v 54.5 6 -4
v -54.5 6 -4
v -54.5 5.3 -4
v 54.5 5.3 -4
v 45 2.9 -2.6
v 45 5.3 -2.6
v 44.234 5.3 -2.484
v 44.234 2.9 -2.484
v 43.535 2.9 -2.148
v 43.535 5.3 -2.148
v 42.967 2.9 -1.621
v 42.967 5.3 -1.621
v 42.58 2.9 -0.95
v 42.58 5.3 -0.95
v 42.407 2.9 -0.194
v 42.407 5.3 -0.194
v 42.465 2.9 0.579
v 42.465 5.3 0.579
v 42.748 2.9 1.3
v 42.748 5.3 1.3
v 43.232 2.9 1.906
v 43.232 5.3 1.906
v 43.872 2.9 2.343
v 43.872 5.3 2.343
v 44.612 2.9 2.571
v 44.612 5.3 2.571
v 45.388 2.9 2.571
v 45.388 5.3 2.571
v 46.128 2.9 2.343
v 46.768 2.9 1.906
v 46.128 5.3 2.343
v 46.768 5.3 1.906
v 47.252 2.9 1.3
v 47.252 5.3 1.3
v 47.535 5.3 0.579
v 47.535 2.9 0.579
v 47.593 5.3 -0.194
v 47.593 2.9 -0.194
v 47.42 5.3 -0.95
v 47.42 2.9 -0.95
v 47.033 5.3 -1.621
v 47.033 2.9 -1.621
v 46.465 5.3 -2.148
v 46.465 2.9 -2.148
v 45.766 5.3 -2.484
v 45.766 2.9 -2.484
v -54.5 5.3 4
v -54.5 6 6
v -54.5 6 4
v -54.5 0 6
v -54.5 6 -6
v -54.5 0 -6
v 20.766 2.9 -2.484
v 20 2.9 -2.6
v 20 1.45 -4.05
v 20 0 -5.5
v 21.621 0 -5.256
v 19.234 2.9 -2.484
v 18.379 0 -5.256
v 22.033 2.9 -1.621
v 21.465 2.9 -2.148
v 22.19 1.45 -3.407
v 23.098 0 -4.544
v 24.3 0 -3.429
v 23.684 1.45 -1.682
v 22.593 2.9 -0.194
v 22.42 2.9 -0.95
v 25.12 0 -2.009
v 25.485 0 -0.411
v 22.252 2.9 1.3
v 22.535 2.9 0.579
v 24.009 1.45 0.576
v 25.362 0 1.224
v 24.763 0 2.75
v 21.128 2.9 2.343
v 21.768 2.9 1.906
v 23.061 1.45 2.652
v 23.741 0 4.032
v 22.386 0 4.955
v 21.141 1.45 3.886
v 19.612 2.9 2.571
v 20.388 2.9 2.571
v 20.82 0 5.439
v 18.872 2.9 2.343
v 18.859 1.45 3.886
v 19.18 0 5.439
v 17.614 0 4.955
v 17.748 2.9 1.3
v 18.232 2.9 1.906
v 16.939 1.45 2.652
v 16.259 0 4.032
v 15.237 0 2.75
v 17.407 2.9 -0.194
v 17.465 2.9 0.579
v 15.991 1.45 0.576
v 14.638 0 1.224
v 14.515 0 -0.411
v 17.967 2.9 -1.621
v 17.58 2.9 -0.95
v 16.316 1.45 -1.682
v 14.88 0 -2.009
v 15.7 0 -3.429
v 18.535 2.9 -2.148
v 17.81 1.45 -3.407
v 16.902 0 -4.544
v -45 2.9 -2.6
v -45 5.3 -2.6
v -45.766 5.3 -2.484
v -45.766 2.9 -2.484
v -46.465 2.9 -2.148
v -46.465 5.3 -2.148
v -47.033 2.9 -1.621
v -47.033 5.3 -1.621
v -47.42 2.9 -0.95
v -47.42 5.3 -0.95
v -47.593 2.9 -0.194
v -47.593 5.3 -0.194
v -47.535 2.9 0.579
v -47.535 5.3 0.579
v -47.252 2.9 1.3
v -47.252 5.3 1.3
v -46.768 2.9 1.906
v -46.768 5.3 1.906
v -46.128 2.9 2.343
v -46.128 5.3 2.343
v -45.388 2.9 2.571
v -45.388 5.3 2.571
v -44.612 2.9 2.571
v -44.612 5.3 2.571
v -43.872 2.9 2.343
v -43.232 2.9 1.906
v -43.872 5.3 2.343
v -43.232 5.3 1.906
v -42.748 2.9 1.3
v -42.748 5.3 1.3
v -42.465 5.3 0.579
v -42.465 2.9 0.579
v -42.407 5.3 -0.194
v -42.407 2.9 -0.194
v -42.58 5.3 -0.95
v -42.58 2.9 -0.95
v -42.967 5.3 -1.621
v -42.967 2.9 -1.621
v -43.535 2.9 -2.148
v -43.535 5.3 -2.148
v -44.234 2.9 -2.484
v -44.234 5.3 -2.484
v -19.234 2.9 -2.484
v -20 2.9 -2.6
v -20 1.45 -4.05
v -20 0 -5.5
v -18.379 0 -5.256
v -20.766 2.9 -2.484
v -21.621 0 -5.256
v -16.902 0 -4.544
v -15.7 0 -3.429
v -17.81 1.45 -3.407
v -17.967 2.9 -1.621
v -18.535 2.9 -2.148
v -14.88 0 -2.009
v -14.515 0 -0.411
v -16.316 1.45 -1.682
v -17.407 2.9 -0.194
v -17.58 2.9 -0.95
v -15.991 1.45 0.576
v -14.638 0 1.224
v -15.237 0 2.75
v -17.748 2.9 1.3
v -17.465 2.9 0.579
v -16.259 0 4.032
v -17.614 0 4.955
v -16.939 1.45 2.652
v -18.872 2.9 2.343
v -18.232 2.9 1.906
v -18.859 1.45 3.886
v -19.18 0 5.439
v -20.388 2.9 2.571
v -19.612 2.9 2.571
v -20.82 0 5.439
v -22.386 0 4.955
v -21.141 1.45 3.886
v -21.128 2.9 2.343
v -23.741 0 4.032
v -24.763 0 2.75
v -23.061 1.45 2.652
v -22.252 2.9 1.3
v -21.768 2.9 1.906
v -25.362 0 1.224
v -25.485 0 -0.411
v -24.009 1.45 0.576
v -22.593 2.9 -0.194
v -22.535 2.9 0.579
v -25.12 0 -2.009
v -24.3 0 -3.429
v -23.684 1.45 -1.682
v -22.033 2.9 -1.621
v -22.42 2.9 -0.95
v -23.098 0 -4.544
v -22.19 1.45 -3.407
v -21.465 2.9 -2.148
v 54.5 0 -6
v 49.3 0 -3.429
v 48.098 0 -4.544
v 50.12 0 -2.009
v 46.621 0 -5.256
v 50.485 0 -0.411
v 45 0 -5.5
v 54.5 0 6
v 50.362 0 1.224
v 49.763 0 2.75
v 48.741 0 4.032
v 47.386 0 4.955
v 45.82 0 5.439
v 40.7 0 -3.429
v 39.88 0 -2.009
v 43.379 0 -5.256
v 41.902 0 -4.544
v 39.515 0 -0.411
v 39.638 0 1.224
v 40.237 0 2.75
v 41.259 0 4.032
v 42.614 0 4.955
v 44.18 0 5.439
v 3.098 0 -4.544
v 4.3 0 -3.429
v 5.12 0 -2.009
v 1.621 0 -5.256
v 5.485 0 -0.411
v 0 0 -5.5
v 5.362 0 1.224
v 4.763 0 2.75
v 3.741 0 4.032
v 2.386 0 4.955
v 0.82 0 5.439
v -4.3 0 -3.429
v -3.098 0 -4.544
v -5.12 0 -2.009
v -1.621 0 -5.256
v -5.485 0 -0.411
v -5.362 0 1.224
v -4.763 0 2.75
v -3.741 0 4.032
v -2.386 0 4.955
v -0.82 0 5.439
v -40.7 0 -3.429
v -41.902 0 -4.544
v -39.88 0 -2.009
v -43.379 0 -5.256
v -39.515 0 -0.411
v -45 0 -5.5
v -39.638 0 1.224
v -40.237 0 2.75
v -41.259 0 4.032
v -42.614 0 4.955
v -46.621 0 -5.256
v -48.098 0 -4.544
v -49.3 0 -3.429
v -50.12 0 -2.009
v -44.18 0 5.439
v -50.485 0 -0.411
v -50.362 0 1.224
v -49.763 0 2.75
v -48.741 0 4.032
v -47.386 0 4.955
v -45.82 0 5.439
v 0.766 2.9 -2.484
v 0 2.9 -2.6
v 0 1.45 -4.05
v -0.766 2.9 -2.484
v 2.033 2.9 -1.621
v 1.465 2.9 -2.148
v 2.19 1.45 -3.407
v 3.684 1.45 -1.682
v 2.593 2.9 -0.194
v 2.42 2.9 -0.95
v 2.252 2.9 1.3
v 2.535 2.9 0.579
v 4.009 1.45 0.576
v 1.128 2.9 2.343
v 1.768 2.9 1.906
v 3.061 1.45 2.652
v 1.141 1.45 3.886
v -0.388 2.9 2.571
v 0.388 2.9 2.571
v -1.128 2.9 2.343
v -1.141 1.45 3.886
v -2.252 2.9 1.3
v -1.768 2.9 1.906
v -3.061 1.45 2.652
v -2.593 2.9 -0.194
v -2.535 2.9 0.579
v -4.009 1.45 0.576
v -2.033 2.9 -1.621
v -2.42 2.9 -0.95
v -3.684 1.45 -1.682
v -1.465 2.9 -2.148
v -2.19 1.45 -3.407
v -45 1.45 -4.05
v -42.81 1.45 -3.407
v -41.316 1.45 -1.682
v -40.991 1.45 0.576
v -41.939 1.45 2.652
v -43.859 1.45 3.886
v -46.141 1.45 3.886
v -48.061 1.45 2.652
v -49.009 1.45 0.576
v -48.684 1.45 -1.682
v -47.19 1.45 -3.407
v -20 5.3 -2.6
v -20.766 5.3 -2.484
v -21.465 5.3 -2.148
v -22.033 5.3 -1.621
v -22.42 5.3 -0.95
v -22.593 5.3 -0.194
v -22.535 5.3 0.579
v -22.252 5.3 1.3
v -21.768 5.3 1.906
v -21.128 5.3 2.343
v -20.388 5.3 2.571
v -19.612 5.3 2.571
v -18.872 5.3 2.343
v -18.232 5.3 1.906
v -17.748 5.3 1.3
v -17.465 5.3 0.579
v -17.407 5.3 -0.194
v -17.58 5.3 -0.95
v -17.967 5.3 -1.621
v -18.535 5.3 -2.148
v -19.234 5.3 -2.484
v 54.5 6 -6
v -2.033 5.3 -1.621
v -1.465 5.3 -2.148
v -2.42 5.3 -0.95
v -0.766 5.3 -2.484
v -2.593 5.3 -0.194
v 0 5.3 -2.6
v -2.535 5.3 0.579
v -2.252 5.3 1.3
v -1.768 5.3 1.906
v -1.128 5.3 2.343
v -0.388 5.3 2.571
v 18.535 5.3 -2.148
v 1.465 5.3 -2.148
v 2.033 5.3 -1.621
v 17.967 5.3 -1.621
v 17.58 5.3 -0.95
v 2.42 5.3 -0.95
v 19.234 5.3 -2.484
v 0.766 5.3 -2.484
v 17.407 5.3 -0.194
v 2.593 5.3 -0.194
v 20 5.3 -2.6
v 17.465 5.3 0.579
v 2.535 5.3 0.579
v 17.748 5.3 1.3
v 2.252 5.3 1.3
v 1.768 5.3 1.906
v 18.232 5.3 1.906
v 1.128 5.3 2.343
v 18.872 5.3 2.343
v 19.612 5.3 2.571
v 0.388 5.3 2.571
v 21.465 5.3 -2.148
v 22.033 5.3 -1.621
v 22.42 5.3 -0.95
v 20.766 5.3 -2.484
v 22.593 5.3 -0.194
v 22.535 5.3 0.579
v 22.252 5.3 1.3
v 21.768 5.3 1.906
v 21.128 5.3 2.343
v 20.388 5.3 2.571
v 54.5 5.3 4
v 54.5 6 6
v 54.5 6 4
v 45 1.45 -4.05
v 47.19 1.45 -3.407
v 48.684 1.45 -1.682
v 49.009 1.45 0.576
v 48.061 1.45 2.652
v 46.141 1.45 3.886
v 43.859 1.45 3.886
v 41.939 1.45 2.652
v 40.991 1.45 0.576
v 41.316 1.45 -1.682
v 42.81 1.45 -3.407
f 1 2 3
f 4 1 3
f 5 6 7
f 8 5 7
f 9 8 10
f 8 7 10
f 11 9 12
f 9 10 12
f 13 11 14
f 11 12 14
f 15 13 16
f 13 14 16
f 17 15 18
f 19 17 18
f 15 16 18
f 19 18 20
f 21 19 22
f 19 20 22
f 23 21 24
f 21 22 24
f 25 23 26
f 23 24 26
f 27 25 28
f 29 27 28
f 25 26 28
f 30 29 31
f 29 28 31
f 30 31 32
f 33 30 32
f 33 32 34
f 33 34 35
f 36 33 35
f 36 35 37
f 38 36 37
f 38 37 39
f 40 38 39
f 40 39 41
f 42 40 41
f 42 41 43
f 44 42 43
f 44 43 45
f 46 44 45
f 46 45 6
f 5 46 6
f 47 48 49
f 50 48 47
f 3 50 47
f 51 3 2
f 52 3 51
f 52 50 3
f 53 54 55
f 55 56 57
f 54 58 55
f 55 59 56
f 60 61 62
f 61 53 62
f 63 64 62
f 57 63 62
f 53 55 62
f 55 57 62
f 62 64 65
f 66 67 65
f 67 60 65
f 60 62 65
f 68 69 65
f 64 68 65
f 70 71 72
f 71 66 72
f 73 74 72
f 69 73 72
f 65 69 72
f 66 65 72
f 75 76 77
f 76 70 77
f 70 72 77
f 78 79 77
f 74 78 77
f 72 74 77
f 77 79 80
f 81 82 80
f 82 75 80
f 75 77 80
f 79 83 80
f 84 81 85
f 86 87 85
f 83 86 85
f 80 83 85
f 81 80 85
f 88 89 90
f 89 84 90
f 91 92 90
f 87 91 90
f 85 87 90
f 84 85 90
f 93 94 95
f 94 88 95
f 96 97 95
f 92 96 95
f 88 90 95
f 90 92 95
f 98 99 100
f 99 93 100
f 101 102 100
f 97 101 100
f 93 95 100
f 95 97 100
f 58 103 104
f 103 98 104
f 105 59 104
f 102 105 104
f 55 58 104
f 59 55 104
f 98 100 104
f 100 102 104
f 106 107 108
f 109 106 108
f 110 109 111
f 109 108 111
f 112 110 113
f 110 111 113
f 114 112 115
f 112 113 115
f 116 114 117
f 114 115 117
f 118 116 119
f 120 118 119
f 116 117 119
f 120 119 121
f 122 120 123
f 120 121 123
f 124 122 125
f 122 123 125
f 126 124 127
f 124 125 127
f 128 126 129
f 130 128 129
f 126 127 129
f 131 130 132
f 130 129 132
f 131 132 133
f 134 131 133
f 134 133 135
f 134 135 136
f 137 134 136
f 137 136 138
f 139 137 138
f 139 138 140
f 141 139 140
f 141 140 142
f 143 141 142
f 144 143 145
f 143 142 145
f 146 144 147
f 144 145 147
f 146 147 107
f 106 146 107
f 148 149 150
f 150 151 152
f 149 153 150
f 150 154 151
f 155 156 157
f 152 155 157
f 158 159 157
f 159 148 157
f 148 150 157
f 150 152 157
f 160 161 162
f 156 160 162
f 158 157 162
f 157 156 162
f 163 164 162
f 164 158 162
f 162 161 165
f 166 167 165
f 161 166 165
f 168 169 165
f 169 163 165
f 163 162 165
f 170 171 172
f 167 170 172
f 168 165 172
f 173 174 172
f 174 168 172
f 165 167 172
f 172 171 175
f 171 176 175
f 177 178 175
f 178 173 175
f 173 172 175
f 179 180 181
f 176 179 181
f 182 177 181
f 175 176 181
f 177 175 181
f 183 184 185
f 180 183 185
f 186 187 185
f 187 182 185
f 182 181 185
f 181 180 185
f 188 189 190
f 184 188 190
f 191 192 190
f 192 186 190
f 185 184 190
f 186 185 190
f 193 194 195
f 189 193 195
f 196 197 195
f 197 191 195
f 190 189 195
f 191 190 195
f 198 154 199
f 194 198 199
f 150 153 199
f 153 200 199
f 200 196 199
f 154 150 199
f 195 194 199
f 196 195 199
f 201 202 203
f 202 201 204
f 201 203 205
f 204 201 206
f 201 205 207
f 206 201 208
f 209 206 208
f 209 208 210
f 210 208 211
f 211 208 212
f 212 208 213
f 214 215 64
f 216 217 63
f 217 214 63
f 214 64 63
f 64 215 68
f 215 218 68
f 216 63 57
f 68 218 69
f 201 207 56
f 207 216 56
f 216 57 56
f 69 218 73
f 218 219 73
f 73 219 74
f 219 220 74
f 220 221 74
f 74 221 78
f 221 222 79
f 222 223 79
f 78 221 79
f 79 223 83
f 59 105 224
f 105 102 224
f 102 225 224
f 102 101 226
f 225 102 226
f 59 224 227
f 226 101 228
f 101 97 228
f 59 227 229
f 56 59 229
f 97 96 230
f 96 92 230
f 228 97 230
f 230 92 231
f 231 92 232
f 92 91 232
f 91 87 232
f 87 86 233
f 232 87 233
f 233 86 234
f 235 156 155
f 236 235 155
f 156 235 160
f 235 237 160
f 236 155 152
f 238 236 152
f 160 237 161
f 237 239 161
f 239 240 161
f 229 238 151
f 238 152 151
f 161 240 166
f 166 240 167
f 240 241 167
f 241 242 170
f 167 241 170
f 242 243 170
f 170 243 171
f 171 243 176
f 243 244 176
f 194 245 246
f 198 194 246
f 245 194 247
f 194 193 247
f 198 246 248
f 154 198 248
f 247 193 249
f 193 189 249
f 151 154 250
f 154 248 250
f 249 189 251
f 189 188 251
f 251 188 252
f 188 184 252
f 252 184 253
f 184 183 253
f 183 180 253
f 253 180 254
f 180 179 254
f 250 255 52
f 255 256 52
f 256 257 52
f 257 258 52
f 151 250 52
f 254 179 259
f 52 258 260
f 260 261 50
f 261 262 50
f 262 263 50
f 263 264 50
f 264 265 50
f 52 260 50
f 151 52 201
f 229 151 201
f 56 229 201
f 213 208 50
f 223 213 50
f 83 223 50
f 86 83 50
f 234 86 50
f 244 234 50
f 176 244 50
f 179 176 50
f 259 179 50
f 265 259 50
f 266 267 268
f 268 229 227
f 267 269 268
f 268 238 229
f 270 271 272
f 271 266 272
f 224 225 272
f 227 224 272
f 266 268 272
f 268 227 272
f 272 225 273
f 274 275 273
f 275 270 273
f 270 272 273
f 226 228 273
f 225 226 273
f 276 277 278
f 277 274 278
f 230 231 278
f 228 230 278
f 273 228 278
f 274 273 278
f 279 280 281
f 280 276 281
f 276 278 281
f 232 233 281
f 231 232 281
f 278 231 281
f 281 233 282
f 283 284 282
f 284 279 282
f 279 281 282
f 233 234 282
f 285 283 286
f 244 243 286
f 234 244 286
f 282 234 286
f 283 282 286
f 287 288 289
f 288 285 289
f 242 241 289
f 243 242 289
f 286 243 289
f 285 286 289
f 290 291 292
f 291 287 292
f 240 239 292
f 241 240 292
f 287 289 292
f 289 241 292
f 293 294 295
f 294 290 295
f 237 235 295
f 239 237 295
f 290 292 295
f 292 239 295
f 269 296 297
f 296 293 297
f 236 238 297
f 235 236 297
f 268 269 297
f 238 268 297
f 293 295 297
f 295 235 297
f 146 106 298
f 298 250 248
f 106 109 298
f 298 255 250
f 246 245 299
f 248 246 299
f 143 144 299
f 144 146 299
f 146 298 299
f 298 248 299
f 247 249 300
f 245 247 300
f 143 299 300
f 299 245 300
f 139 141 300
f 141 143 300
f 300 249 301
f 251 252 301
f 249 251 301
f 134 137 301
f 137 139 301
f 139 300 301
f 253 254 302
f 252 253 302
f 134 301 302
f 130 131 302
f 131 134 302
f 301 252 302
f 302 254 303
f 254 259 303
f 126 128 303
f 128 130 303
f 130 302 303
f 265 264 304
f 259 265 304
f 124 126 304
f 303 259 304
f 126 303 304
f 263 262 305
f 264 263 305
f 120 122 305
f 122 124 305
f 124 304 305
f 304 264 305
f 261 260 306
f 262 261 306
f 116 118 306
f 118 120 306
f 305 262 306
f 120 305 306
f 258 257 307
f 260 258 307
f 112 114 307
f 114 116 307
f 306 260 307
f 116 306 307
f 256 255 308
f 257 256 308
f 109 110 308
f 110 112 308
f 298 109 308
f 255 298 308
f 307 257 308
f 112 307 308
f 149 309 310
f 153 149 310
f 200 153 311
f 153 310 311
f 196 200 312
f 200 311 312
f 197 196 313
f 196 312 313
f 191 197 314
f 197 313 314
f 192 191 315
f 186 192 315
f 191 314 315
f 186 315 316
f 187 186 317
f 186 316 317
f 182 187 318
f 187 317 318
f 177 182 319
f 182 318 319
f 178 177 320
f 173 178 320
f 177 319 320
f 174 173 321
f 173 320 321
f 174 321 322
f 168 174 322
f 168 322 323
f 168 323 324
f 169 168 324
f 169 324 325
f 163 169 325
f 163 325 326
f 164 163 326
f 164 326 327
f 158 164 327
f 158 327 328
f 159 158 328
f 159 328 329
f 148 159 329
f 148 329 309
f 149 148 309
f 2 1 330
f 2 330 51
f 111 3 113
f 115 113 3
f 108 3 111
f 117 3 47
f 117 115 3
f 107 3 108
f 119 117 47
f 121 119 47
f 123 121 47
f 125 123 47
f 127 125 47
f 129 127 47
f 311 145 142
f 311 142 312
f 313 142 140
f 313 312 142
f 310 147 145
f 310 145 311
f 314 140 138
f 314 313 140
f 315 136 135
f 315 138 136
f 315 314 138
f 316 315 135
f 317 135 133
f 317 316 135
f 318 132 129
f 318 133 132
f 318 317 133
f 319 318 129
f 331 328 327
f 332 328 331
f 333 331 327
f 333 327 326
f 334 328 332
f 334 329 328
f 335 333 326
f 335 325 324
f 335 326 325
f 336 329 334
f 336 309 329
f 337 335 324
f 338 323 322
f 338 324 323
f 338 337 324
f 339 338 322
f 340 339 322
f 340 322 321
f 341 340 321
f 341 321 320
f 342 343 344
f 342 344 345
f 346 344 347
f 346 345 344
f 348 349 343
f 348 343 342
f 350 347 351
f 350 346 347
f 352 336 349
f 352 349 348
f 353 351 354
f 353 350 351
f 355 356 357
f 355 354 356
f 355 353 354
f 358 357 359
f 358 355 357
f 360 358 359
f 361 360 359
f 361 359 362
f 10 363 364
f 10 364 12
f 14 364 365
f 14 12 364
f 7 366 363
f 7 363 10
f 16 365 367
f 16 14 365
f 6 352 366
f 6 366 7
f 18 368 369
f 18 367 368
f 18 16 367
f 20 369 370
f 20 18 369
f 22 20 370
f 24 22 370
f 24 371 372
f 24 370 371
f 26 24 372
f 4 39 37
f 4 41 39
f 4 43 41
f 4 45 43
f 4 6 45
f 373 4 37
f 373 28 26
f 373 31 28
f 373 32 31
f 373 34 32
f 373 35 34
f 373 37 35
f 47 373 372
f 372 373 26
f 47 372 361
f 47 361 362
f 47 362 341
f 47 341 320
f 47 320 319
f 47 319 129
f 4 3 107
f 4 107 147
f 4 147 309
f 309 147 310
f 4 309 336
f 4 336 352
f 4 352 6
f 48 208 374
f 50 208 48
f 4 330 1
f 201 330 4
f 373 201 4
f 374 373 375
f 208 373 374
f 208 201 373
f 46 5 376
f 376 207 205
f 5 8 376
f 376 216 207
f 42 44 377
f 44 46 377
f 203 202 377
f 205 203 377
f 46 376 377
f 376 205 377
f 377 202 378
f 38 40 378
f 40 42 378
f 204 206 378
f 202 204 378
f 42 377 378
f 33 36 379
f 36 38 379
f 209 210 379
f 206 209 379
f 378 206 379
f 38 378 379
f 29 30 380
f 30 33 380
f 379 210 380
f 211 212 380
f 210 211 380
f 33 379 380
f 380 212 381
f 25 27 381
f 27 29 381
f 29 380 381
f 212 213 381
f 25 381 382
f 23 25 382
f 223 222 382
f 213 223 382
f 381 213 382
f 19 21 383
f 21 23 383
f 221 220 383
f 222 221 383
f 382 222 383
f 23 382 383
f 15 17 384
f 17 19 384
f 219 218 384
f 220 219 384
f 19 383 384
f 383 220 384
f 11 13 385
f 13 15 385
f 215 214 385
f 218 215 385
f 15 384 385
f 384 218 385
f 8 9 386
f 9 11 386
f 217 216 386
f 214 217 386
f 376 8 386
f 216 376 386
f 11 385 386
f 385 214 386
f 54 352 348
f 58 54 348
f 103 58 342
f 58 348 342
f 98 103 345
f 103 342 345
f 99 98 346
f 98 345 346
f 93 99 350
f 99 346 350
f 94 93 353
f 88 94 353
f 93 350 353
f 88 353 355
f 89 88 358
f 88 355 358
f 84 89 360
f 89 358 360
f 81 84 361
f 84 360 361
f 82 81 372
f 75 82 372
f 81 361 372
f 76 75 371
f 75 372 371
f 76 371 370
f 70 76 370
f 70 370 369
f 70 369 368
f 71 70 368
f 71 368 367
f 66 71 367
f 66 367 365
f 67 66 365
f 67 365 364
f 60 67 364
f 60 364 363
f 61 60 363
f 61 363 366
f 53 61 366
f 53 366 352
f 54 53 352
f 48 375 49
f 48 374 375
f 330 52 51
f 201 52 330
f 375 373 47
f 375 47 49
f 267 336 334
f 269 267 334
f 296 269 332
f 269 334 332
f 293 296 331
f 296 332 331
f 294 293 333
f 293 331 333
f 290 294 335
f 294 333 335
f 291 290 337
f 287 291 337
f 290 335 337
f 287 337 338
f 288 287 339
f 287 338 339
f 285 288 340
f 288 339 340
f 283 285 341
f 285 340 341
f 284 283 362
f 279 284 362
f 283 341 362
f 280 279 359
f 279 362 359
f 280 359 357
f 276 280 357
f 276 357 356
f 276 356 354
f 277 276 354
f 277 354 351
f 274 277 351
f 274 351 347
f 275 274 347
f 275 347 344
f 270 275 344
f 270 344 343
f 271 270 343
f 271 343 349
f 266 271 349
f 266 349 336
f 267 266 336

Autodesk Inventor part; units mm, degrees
ref_plane "YZ Plane" through (0, 0, 0) normal (1, 0, 0) x (0, 1, 0)
ref_plane "XZ Plane" through (0, 0, 0) normal (0, 1, 0) x (-1, 0, 0)
ref_plane "XY Plane" through (0, 0, 0) normal (0, 0, 1) x (1, 0, 0)
sketch "Body Outline" plane through (0, 0, 0) normal (0, 1, 0) x (-1, 0, 0)
  line L0 (54.5, -6) -> (-54.5, -6)
  line L1 (-54.5, -6) -> (-54.5, 6)
  line L2 (-54.5, 6) -> (54.5, 6)
  line L3 (54.5, 6) -> (54.5, -6)
  point P0 (0, 0)
  dimension "d0" = 109
  dimension "d1" = 54.5
  dimension "d2" = 12
  dimension "d3" = 6
extrude "Body" add sketch "Body Outline" along normal blind 6
sketch "Clamp Cutout Outline" plane through (54.5, 0, 6) normal (1, 0, 0) x (0, 0, -1)
  line L0 (2, 7.3) -> (10, 7.3)
  line L1 (10, 7.3) -> (10, 5.3)
  line L2 (10, 5.3) -> (2, 5.3)
  line L3 (2, 5.3) -> (2, 7.3)
  line L4 (0, 6) -> (12, 6) projected
  line L5 (0, 0) -> (0, 6) projected
  line L6 (12, 0) -> (12, 6) projected
  point P0 (6, 0)
  dimension "d6" = 0.7
  dimension "d7" = 2
  dimension "d8" = 2
  dimension "d9" = 2
extrude "Clamp Cutout" cut sketch "Clamp Cutout Outline" along normal through all both and the other way through all
sketch "Fastening Hole Positions" plane through (0, 0, 0) normal (0, -1, 0) x (1, 0, 0)
  point P0 (0, 0)
  point P1 (20, 0)
  point P2 (0, 0)
  point P3 (-20, 0)
  point P4 (45, 0)
  point P5 (-45, 0)
  dimension "d12" = 20
  dimension "d13" = 20
  dimension "d14" = 0
  dimension "d15" = 0
  dimension "d16" = 0
  dimension "d17" = 0
  dimension "d26" = 25
  dimension "d27" = 25
  dimension "d28" = 0
  dimension "d29" = 0
hole "Fastening Holes" at (20, 0, 0) at (0, 0, 0) at (-20, 0, 0) at (-45, 0, 0) at (45, 0, 0) direction (0, 1, 0) diameter 5.2 end through all countersink diameter 11 countersink angle 90
equation "\"d1\" = 0.5 * d0"
equation "\"d3\" = 0.5 * d2"
equation "\"d8\" = d7"
properties part number "LR Large Clamp" material "Aluminum 6061"
